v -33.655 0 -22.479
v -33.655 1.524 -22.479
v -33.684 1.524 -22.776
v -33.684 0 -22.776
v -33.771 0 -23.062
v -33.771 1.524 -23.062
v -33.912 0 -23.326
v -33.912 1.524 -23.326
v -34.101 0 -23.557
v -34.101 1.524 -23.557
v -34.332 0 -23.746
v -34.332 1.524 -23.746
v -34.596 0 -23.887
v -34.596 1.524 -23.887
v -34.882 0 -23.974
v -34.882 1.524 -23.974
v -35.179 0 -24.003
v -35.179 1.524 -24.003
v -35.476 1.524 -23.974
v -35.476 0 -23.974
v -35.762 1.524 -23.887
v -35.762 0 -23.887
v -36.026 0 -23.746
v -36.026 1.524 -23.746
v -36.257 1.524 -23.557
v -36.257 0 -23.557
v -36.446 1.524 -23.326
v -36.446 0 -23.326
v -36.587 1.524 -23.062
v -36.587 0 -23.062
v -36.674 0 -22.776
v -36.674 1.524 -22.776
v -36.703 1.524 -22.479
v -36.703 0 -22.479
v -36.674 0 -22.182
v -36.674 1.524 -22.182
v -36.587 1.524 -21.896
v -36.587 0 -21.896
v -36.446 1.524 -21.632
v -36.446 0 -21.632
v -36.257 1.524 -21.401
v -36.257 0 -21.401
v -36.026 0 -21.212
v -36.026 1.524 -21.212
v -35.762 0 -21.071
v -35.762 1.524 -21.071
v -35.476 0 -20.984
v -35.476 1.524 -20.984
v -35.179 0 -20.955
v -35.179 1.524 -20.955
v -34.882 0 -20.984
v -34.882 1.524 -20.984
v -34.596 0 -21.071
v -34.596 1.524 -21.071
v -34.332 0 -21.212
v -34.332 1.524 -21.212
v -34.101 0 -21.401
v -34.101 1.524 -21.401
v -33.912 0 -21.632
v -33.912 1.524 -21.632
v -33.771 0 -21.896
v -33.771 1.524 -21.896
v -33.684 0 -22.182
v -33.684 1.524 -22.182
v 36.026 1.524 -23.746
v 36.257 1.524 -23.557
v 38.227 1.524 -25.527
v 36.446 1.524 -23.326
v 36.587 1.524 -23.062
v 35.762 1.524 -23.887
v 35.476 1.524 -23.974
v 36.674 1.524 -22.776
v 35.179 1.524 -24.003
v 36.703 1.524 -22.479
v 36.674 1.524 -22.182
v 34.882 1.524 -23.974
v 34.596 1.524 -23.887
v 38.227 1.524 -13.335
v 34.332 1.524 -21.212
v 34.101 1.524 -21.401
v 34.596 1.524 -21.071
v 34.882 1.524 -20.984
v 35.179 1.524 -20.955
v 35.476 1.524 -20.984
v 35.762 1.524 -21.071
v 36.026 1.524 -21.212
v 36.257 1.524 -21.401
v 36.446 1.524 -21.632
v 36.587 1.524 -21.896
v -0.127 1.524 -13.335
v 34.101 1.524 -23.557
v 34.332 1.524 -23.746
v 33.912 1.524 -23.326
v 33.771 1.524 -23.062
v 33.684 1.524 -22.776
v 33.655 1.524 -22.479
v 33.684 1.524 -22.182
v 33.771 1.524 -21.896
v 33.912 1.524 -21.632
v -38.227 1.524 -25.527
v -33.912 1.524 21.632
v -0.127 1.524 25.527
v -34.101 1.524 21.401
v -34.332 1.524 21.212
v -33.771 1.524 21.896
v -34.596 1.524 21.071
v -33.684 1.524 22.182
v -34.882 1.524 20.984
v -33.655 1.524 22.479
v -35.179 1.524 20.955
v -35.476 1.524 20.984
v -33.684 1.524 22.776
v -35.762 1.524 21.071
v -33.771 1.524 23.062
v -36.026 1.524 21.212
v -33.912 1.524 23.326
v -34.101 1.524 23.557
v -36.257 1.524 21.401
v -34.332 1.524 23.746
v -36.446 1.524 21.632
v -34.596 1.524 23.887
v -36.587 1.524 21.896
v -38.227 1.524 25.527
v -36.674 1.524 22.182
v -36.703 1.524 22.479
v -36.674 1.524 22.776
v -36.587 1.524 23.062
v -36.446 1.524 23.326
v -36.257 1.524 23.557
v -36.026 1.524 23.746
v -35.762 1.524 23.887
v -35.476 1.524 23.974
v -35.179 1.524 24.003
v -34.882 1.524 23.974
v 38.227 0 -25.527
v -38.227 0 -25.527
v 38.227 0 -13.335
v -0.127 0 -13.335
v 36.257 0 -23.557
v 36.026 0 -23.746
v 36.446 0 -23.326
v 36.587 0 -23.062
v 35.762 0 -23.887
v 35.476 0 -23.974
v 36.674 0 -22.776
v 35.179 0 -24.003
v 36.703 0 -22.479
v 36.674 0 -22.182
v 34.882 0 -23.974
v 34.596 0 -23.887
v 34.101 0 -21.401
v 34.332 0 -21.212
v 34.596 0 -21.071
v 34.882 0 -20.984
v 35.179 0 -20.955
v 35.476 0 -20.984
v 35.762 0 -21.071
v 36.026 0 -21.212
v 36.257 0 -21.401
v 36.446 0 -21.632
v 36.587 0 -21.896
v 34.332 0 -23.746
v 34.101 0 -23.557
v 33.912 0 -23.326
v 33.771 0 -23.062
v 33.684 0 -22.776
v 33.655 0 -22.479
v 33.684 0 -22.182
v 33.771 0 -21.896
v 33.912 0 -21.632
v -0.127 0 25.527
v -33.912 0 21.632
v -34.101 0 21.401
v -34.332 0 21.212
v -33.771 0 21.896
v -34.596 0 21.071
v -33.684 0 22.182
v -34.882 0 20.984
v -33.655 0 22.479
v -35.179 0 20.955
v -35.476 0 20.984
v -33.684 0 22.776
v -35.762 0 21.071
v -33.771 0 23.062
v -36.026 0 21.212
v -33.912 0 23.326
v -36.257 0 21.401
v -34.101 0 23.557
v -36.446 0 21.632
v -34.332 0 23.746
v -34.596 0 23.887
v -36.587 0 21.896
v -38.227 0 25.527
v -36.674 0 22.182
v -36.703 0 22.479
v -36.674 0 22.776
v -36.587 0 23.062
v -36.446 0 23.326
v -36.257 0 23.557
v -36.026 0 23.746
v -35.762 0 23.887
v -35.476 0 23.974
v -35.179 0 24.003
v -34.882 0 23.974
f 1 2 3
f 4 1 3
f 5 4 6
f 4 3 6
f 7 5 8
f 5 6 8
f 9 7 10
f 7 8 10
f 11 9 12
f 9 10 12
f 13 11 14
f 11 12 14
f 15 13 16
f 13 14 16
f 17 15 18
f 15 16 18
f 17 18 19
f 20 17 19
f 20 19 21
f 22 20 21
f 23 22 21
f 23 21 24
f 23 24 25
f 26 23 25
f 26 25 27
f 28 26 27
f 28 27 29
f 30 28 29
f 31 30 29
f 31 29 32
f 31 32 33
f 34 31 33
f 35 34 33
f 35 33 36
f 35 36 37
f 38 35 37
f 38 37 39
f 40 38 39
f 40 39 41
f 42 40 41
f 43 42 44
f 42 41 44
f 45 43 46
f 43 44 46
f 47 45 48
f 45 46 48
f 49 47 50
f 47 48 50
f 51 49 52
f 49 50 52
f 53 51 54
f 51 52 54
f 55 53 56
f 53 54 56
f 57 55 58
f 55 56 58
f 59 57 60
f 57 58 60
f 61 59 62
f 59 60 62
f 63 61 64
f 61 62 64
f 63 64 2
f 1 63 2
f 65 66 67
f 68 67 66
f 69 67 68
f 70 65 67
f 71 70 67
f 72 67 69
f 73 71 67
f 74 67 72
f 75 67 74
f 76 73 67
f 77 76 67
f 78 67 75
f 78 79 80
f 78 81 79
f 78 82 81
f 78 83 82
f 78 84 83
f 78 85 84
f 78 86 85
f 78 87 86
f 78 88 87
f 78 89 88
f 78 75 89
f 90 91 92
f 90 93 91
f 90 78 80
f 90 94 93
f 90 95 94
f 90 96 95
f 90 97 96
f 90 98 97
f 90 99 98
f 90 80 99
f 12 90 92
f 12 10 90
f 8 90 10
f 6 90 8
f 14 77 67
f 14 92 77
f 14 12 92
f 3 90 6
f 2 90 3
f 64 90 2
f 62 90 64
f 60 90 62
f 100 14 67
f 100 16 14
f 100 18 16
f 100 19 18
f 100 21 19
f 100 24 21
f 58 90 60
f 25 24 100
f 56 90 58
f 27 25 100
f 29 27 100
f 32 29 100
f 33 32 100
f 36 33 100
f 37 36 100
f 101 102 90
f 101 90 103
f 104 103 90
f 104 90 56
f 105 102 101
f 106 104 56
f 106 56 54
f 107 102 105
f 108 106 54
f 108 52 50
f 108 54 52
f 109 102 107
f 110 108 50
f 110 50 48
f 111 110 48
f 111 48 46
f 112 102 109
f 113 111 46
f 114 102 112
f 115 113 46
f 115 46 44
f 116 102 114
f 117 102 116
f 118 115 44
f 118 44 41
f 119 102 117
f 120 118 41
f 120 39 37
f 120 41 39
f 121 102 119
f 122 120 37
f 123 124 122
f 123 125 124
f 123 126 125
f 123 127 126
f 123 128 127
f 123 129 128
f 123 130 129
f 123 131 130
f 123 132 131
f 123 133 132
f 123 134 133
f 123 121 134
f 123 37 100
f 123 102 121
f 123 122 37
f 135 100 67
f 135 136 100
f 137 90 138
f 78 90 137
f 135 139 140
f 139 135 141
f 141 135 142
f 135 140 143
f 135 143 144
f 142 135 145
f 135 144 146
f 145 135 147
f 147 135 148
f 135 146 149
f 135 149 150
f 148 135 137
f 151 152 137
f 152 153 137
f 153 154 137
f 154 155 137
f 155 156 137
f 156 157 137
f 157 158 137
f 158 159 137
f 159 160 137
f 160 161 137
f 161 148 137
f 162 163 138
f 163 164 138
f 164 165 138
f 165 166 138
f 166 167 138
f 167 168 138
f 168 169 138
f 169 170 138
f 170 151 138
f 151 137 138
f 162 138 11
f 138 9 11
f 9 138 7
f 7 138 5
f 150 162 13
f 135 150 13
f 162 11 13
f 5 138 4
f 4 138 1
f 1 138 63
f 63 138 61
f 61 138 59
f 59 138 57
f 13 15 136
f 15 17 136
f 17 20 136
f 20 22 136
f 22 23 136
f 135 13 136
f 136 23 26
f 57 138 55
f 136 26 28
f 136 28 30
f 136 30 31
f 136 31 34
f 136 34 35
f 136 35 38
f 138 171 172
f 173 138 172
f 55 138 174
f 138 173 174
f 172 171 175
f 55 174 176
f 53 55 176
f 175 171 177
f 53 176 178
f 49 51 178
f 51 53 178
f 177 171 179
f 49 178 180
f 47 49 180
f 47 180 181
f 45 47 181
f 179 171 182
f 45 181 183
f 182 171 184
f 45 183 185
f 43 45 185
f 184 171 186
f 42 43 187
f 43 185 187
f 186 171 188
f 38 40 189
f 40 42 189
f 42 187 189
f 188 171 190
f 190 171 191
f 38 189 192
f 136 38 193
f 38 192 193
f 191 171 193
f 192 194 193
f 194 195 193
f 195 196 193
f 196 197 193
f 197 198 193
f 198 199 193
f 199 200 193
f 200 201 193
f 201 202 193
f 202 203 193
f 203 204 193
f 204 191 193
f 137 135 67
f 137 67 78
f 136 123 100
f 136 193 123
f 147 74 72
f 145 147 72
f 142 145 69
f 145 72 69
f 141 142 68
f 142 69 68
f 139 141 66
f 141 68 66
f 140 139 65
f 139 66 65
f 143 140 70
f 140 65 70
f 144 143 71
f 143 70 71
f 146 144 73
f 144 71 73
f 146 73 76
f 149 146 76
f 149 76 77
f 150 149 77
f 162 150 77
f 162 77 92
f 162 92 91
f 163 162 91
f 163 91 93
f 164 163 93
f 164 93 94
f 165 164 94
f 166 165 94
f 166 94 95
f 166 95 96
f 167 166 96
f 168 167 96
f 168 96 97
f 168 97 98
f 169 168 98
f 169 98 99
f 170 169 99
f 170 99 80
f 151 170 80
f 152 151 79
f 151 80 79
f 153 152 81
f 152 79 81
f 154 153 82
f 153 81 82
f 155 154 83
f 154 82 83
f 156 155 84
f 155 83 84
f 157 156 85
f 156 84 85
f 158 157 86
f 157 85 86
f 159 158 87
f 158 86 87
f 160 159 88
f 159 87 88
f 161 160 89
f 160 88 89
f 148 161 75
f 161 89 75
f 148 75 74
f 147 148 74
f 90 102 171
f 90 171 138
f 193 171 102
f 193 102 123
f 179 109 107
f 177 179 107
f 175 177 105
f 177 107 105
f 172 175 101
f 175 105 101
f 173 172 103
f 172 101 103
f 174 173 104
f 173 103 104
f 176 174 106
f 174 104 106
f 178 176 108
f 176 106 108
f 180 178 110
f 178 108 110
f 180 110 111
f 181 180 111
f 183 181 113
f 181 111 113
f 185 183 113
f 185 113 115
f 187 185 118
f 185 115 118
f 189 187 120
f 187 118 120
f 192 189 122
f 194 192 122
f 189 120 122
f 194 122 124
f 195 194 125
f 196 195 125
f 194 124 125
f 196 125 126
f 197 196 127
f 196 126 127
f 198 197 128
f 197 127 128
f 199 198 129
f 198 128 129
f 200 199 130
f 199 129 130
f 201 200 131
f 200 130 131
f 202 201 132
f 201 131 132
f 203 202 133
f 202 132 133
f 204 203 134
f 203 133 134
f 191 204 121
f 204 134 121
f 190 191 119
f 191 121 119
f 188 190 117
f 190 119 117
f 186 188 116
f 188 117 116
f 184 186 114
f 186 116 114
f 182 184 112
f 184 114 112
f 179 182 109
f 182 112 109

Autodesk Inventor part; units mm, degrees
ref_plane "YZ Plane" through (0, 0, 0) normal (1, 0, 0) x (0, 1, 0)
ref_plane "XZ Plane" through (0, 0, 0) normal (0, 1, 0) x (-1, 0, 0)
ref_plane "XY Plane" through (0, 0, 0) normal (0, 0, 1) x (1, 0, 0)
sketch "Sketch1" plane through (0, 0, 0) normal (0, 1, 0) x (-1, 0, 0)
  line L0 (-38.227, 25.527) -> (38.227, 25.527)
  line L1 (38.227, 25.527) -> (38.227, -25.527)
  line L2 (38.227, -25.527) -> (-38.227, -25.527)
  line L3 (-38.227, -25.527) -> (-38.227, 25.527)
  line L4 (-38.227, 25.527) -> (38.227, -25.527) construction
  point P0 (0, 0)
  point P1 (0, 0)
  dimension "d0" = 76.454
  dimension "d1" = 51.054
extrude "Extrusion1" add sketch "Sketch1" along normal blind 1.524
sketch "Sketch2" plane through (0, 1.524, 0) normal (0, 1, 0) x (1, 0, 0)
  line L0 (-38.227, -25.527) -> (38.227, -25.527) projected
  line L1 (38.227, -25.527) -> (38.227, 25.527) projected
  line L2 (38.227, 25.527) -> (-38.227, 25.527) projected
  line L3 (-38.227, 25.527) -> (-38.227, -25.527) projected
  circle A0 centre (-35.179, 22.479) radius 1.524
  circle A1 centre (-35.179, -22.479) radius 1.524
  circle A2 centre (35.179, 22.479) radius 1.524
  circle A3 centre (35.179, -22.479) radius 1.524
  point P0 (0, 0)
  dimension "d4" = 3.048
  dimension "d5" = 3.048
  dimension "d6" = 3.048
  dimension "d7" = 3.048
  dimension "d8" = 3.048
  dimension "d9" = 3.048
  dimension "d10" = 3.048
  dimension "d11" = 3.048
  dimension "d12" = 3.048
extrude "Extrusion2" cut sketch "Sketch2" against normal up to next contours A0 | A1 | A2 | A3
sketch "Sketch6" plane through (0, 1.524, 0) normal (0, 1, 0) x (1, 0, 0)
  line L0 (38.227, -25.527) -> (-0.127, -25.527)
  line L1 (-0.127, -25.527) -> (-0.127, 13.335)
  line L2 (-0.127, 13.335) -> (38.227, 13.335)
  line L3 (38.227, 13.335) -> (38.227, -25.527)
  line L4 (23.495, 18.415) -> (24.003, 18.415) projected
  line L5 (38.227, 25.527) -> (-38.227, 25.527) projected
  line L6 (-38.227, 25.527) -> (-38.227, -25.527) projected
  point P0 (0, 0)
  dimension "d23" = 12.192
  dimension "d24" = 38.1
extrude "Extrusion3" cut sketch "Sketch6" against normal blind 25.4
properties part number "MainBoard" material "Silicon Nitride"
